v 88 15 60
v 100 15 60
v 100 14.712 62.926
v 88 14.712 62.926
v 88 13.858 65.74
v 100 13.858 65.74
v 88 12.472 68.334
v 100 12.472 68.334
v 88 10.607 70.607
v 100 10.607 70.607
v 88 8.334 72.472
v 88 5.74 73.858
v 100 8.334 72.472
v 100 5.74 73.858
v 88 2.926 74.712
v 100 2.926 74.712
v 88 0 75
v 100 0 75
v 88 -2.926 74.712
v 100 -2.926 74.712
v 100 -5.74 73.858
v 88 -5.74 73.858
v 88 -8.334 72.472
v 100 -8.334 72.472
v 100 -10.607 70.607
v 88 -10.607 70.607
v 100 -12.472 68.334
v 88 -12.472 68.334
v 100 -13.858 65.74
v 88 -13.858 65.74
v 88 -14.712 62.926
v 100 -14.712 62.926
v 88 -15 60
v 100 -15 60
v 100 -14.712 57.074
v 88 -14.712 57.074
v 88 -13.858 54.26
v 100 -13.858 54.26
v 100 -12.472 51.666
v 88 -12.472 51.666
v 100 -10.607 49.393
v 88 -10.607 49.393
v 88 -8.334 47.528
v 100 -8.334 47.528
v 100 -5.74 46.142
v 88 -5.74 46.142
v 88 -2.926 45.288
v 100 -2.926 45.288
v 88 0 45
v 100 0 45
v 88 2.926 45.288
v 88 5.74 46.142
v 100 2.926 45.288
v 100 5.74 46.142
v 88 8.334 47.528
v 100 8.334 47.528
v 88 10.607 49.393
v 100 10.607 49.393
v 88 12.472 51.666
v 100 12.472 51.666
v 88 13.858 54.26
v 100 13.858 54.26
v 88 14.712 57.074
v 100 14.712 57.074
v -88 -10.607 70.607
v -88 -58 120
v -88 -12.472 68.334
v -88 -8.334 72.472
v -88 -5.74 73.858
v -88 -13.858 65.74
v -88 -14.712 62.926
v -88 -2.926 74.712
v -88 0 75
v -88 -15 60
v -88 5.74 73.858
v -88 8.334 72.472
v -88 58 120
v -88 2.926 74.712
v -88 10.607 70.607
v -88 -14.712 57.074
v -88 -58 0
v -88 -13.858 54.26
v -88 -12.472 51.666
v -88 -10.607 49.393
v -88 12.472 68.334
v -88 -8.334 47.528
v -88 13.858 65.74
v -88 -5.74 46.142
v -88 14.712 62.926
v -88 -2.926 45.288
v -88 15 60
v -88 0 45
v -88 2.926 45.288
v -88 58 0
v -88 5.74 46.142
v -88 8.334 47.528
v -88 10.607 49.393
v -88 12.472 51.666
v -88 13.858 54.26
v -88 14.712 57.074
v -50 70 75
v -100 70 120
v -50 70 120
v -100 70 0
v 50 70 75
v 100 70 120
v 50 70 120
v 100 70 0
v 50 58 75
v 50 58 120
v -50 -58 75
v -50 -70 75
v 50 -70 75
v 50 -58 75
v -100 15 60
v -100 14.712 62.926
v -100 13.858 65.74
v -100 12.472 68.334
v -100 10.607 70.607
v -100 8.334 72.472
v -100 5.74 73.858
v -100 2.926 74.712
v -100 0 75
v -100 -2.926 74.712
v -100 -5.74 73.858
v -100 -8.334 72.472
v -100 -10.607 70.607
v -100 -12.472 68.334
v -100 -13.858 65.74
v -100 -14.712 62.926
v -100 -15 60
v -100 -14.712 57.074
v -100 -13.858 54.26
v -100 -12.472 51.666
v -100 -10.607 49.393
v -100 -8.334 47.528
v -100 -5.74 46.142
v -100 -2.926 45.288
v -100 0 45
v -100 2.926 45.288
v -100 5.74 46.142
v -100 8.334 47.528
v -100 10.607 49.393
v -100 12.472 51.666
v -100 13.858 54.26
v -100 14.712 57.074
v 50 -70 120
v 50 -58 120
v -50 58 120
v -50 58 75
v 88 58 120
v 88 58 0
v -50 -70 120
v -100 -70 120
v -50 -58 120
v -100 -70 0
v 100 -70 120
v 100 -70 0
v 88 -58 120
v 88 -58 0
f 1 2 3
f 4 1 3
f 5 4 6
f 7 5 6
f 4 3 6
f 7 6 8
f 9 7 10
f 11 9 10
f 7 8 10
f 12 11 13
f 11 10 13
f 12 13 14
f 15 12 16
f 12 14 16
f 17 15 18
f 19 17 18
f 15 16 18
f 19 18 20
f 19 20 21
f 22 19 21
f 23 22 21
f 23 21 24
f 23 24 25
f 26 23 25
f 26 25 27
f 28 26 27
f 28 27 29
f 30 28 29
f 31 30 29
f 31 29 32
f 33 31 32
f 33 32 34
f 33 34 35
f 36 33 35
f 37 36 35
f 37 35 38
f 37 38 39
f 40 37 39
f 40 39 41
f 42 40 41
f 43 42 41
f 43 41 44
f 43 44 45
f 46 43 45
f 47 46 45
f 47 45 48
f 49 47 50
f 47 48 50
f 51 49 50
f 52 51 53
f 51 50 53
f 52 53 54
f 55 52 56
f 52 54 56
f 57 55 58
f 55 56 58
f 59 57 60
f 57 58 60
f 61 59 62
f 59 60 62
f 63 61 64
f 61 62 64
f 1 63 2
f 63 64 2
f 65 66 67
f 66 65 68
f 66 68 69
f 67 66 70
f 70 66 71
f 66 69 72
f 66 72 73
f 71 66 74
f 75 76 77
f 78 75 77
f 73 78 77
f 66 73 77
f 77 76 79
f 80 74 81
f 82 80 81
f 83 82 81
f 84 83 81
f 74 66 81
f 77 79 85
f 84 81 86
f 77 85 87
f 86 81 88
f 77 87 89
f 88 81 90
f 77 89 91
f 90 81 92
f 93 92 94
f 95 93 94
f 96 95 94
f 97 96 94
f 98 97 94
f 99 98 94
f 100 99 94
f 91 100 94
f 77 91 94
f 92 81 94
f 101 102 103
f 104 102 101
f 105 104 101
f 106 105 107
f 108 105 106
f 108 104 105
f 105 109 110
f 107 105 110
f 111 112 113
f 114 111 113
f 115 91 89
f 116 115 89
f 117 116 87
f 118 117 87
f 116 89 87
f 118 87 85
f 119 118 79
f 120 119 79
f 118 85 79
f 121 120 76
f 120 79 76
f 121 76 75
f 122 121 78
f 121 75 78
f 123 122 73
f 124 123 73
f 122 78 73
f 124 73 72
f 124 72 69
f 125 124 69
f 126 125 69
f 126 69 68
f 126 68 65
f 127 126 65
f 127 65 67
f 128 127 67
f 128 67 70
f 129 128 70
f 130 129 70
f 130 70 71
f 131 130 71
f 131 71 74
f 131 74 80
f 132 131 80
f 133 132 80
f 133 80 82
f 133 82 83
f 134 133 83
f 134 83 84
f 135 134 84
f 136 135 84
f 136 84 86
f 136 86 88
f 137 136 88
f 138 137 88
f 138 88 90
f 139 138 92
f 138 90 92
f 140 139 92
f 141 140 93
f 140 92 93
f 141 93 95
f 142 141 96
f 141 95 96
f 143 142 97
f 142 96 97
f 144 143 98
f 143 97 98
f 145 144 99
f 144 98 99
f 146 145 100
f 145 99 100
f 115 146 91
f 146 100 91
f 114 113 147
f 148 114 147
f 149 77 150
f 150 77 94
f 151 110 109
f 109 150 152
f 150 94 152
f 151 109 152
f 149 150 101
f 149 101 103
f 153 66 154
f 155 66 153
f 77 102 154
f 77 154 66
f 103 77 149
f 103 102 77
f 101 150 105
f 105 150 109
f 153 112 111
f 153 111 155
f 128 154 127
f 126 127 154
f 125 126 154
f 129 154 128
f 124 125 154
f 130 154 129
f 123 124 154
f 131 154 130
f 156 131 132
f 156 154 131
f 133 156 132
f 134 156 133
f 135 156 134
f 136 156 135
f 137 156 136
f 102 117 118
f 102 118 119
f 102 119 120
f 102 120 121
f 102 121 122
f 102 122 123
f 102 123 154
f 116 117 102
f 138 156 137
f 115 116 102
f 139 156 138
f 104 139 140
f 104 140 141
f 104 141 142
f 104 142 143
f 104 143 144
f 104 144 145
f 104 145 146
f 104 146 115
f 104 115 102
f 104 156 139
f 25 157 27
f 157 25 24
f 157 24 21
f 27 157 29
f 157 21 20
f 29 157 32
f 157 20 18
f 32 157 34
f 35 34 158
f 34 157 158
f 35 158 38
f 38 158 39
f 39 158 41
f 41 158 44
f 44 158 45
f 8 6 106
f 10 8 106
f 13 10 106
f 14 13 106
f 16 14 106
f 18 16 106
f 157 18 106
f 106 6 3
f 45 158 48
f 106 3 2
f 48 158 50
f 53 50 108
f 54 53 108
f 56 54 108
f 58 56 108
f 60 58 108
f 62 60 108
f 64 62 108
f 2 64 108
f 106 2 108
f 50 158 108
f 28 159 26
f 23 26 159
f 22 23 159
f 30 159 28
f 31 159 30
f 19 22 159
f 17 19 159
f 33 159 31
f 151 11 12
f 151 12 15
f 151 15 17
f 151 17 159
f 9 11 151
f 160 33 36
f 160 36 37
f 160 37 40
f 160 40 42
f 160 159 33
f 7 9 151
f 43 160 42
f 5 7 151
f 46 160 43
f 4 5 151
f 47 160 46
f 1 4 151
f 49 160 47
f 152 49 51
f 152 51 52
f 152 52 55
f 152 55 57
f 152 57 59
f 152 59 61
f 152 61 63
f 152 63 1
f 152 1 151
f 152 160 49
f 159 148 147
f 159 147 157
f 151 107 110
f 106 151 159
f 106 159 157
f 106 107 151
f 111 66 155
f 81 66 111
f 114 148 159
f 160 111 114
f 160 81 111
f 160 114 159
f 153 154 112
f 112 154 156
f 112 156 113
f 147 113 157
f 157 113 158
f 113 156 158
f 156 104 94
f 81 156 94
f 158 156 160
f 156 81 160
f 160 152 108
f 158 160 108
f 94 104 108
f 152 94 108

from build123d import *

# Parameters (mm, degrees)
F0_W     = 200
F0_H     = 140
F0_W_2   = 176
F0_H_2   = 116
F1_DEPTH = 120
F2_R     = 15
F3_DEPTH = 200.001
F4_W     = 100
F4_H     = 45
F5_DEPTH = 140.001


with BuildPart() as f1:
    # F0 (on Top) → F1 (new body)
    with BuildSketch(Plane.XY):
        Rectangle(F0_W, F0_H)
        Rectangle(F0_W_2, F0_H_2, mode=Mode.SUBTRACT)
    extrude(amount=F1_DEPTH)

    # F2 (on face) → F3 (cut, through all)
    with BuildSketch(Plane.YZ.offset(100)):
        with Locations((0, 60)):
            Circle(F2_R)
    extrude(amount=-F3_DEPTH, mode=Mode.SUBTRACT)

    # F4 (on face) → F5 (cut, through all)
    with BuildSketch(Plane.XZ.offset(70)):
        with Locations((0, 97.5)):
            Rectangle(F4_W, F4_H)
    extrude(amount=-F5_DEPTH, mode=Mode.SUBTRACT)


solid = f1.part
